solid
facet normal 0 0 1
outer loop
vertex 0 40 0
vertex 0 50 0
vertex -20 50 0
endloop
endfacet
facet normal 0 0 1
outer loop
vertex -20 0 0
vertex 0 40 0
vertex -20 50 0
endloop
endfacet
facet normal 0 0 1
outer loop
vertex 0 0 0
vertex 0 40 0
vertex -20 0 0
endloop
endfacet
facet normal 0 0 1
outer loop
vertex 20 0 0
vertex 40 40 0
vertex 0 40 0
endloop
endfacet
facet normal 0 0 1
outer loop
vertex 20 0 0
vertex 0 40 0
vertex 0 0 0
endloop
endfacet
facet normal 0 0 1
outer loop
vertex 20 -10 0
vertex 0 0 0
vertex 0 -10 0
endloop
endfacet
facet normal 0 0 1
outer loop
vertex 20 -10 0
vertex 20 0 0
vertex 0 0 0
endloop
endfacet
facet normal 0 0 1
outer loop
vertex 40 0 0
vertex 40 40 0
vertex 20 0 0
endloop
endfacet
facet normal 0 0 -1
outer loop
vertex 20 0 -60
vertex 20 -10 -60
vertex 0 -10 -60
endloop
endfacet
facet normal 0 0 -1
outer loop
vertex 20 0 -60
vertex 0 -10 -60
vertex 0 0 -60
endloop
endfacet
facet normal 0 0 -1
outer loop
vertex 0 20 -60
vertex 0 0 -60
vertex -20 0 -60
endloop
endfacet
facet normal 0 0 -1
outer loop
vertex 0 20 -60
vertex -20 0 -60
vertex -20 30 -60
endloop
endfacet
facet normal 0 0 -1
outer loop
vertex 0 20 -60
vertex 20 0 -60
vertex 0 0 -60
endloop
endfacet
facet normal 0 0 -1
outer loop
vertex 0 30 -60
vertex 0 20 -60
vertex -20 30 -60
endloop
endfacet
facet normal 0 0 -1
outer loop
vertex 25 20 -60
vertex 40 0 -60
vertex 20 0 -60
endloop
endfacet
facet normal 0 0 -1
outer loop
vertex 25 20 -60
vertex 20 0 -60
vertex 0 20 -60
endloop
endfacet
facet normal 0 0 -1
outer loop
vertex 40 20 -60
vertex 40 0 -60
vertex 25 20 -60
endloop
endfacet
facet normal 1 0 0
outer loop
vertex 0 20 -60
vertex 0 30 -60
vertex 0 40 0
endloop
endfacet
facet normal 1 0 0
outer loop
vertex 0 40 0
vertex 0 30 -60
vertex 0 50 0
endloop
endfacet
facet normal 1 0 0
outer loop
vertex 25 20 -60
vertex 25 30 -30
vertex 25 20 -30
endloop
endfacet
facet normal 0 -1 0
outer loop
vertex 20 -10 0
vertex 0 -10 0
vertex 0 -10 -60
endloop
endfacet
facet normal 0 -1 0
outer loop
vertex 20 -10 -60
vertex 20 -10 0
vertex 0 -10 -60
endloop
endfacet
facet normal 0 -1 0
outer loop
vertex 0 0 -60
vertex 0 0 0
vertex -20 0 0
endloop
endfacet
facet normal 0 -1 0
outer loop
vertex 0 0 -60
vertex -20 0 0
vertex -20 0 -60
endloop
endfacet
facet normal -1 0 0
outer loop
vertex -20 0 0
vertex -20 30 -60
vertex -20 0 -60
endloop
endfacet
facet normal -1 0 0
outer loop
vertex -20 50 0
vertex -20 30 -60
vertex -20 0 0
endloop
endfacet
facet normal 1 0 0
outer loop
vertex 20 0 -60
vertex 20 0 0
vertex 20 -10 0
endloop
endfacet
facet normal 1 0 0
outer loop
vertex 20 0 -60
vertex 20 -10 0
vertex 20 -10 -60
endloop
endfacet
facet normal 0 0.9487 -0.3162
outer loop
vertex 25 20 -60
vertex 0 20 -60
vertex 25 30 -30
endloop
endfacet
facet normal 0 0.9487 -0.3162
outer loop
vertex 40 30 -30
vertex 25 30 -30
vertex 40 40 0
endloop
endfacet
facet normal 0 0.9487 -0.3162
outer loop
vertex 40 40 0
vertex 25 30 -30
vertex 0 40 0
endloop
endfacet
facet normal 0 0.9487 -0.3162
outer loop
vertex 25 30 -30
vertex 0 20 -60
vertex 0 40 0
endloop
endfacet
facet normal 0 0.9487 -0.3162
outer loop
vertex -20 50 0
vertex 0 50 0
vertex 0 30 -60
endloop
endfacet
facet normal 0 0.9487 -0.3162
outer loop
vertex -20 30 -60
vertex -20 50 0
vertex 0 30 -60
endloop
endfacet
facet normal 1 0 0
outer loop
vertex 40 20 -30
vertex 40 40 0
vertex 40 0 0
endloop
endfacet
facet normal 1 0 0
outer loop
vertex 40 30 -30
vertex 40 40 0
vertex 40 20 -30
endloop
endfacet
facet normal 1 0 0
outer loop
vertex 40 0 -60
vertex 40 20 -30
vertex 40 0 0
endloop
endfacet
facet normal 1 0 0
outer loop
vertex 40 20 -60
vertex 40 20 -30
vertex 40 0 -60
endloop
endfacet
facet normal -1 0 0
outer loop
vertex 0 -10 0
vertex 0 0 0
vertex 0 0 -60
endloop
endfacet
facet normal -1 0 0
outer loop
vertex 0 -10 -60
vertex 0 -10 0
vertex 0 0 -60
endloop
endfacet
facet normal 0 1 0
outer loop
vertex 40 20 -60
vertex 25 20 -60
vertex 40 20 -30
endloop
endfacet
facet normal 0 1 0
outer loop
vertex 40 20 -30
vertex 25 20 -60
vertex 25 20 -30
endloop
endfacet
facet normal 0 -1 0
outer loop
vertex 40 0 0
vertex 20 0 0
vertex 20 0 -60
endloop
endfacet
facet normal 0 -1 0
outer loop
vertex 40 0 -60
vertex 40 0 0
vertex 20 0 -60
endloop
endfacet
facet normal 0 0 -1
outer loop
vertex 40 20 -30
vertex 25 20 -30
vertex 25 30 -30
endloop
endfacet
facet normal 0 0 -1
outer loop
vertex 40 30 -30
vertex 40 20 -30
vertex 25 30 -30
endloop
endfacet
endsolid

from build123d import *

# Parameters (mm, degrees)
BOSS_EXTRUDE7_DEPTH  = 25
SKETCH1_12_W         = 60
SKETCH1_12_H         = 10
BOSS_EXTRUDE8_DEPTH  = 20
BOSS_EXTRUDE9_DEPTH  = 40
BOSS_EXTRUDE10_DEPTH = 20


with BuildPart() as part:
    # Sketch1 → Boss-Extrude7 (new body)
    with BuildSketch(Plane(origin=(0, 0, 0), x_dir=(0, 0, -1), z_dir=(1, 0, 0))):
        Polygon((60, 20), (30, 30), (30, 20), align=None)
    extrude(amount=BOSS_EXTRUDE7_DEPTH)



with BuildPart() as body_2:
    # Sketch1<12> → Boss-Extrude8 (new body)
    with BuildSketch(Plane(origin=(0, 0, 0), x_dir=(0, 0, -1), z_dir=(1, 0, 0))):
        with Locations((30, -5)):
            Rectangle(SKETCH1_12_W, SKETCH1_12_H)
    extrude(amount=BOSS_EXTRUDE8_DEPTH)


with BuildPart() as part_1:
    add(part.part)

    add(body_2.part)  # Boss-Extrude9 merges body 2
    # Sketch1<13> → Boss-Extrude9 (add)
    with BuildSketch(Plane(origin=(0, 0, 0), x_dir=(0, 0, -1), z_dir=(1, 0, 0))):
        Polygon((30, 30), (0, 40), (0, 0), (60, 0), (60, 20), (30, 20), align=None)
    extrude(amount=BOSS_EXTRUDE9_DEPTH)

    # Sketch1<14> → Boss-Extrude10 (add)
    with BuildSketch(Plane(origin=(0, 0, 0), x_dir=(0, 0, -1), z_dir=(1, 0, 0))):
        Polygon((60, 0), (60, 30), (0, 50), (0, 0), align=None)
    extrude(amount=-BOSS_EXTRUDE10_DEPTH)


solid = part_1.part
